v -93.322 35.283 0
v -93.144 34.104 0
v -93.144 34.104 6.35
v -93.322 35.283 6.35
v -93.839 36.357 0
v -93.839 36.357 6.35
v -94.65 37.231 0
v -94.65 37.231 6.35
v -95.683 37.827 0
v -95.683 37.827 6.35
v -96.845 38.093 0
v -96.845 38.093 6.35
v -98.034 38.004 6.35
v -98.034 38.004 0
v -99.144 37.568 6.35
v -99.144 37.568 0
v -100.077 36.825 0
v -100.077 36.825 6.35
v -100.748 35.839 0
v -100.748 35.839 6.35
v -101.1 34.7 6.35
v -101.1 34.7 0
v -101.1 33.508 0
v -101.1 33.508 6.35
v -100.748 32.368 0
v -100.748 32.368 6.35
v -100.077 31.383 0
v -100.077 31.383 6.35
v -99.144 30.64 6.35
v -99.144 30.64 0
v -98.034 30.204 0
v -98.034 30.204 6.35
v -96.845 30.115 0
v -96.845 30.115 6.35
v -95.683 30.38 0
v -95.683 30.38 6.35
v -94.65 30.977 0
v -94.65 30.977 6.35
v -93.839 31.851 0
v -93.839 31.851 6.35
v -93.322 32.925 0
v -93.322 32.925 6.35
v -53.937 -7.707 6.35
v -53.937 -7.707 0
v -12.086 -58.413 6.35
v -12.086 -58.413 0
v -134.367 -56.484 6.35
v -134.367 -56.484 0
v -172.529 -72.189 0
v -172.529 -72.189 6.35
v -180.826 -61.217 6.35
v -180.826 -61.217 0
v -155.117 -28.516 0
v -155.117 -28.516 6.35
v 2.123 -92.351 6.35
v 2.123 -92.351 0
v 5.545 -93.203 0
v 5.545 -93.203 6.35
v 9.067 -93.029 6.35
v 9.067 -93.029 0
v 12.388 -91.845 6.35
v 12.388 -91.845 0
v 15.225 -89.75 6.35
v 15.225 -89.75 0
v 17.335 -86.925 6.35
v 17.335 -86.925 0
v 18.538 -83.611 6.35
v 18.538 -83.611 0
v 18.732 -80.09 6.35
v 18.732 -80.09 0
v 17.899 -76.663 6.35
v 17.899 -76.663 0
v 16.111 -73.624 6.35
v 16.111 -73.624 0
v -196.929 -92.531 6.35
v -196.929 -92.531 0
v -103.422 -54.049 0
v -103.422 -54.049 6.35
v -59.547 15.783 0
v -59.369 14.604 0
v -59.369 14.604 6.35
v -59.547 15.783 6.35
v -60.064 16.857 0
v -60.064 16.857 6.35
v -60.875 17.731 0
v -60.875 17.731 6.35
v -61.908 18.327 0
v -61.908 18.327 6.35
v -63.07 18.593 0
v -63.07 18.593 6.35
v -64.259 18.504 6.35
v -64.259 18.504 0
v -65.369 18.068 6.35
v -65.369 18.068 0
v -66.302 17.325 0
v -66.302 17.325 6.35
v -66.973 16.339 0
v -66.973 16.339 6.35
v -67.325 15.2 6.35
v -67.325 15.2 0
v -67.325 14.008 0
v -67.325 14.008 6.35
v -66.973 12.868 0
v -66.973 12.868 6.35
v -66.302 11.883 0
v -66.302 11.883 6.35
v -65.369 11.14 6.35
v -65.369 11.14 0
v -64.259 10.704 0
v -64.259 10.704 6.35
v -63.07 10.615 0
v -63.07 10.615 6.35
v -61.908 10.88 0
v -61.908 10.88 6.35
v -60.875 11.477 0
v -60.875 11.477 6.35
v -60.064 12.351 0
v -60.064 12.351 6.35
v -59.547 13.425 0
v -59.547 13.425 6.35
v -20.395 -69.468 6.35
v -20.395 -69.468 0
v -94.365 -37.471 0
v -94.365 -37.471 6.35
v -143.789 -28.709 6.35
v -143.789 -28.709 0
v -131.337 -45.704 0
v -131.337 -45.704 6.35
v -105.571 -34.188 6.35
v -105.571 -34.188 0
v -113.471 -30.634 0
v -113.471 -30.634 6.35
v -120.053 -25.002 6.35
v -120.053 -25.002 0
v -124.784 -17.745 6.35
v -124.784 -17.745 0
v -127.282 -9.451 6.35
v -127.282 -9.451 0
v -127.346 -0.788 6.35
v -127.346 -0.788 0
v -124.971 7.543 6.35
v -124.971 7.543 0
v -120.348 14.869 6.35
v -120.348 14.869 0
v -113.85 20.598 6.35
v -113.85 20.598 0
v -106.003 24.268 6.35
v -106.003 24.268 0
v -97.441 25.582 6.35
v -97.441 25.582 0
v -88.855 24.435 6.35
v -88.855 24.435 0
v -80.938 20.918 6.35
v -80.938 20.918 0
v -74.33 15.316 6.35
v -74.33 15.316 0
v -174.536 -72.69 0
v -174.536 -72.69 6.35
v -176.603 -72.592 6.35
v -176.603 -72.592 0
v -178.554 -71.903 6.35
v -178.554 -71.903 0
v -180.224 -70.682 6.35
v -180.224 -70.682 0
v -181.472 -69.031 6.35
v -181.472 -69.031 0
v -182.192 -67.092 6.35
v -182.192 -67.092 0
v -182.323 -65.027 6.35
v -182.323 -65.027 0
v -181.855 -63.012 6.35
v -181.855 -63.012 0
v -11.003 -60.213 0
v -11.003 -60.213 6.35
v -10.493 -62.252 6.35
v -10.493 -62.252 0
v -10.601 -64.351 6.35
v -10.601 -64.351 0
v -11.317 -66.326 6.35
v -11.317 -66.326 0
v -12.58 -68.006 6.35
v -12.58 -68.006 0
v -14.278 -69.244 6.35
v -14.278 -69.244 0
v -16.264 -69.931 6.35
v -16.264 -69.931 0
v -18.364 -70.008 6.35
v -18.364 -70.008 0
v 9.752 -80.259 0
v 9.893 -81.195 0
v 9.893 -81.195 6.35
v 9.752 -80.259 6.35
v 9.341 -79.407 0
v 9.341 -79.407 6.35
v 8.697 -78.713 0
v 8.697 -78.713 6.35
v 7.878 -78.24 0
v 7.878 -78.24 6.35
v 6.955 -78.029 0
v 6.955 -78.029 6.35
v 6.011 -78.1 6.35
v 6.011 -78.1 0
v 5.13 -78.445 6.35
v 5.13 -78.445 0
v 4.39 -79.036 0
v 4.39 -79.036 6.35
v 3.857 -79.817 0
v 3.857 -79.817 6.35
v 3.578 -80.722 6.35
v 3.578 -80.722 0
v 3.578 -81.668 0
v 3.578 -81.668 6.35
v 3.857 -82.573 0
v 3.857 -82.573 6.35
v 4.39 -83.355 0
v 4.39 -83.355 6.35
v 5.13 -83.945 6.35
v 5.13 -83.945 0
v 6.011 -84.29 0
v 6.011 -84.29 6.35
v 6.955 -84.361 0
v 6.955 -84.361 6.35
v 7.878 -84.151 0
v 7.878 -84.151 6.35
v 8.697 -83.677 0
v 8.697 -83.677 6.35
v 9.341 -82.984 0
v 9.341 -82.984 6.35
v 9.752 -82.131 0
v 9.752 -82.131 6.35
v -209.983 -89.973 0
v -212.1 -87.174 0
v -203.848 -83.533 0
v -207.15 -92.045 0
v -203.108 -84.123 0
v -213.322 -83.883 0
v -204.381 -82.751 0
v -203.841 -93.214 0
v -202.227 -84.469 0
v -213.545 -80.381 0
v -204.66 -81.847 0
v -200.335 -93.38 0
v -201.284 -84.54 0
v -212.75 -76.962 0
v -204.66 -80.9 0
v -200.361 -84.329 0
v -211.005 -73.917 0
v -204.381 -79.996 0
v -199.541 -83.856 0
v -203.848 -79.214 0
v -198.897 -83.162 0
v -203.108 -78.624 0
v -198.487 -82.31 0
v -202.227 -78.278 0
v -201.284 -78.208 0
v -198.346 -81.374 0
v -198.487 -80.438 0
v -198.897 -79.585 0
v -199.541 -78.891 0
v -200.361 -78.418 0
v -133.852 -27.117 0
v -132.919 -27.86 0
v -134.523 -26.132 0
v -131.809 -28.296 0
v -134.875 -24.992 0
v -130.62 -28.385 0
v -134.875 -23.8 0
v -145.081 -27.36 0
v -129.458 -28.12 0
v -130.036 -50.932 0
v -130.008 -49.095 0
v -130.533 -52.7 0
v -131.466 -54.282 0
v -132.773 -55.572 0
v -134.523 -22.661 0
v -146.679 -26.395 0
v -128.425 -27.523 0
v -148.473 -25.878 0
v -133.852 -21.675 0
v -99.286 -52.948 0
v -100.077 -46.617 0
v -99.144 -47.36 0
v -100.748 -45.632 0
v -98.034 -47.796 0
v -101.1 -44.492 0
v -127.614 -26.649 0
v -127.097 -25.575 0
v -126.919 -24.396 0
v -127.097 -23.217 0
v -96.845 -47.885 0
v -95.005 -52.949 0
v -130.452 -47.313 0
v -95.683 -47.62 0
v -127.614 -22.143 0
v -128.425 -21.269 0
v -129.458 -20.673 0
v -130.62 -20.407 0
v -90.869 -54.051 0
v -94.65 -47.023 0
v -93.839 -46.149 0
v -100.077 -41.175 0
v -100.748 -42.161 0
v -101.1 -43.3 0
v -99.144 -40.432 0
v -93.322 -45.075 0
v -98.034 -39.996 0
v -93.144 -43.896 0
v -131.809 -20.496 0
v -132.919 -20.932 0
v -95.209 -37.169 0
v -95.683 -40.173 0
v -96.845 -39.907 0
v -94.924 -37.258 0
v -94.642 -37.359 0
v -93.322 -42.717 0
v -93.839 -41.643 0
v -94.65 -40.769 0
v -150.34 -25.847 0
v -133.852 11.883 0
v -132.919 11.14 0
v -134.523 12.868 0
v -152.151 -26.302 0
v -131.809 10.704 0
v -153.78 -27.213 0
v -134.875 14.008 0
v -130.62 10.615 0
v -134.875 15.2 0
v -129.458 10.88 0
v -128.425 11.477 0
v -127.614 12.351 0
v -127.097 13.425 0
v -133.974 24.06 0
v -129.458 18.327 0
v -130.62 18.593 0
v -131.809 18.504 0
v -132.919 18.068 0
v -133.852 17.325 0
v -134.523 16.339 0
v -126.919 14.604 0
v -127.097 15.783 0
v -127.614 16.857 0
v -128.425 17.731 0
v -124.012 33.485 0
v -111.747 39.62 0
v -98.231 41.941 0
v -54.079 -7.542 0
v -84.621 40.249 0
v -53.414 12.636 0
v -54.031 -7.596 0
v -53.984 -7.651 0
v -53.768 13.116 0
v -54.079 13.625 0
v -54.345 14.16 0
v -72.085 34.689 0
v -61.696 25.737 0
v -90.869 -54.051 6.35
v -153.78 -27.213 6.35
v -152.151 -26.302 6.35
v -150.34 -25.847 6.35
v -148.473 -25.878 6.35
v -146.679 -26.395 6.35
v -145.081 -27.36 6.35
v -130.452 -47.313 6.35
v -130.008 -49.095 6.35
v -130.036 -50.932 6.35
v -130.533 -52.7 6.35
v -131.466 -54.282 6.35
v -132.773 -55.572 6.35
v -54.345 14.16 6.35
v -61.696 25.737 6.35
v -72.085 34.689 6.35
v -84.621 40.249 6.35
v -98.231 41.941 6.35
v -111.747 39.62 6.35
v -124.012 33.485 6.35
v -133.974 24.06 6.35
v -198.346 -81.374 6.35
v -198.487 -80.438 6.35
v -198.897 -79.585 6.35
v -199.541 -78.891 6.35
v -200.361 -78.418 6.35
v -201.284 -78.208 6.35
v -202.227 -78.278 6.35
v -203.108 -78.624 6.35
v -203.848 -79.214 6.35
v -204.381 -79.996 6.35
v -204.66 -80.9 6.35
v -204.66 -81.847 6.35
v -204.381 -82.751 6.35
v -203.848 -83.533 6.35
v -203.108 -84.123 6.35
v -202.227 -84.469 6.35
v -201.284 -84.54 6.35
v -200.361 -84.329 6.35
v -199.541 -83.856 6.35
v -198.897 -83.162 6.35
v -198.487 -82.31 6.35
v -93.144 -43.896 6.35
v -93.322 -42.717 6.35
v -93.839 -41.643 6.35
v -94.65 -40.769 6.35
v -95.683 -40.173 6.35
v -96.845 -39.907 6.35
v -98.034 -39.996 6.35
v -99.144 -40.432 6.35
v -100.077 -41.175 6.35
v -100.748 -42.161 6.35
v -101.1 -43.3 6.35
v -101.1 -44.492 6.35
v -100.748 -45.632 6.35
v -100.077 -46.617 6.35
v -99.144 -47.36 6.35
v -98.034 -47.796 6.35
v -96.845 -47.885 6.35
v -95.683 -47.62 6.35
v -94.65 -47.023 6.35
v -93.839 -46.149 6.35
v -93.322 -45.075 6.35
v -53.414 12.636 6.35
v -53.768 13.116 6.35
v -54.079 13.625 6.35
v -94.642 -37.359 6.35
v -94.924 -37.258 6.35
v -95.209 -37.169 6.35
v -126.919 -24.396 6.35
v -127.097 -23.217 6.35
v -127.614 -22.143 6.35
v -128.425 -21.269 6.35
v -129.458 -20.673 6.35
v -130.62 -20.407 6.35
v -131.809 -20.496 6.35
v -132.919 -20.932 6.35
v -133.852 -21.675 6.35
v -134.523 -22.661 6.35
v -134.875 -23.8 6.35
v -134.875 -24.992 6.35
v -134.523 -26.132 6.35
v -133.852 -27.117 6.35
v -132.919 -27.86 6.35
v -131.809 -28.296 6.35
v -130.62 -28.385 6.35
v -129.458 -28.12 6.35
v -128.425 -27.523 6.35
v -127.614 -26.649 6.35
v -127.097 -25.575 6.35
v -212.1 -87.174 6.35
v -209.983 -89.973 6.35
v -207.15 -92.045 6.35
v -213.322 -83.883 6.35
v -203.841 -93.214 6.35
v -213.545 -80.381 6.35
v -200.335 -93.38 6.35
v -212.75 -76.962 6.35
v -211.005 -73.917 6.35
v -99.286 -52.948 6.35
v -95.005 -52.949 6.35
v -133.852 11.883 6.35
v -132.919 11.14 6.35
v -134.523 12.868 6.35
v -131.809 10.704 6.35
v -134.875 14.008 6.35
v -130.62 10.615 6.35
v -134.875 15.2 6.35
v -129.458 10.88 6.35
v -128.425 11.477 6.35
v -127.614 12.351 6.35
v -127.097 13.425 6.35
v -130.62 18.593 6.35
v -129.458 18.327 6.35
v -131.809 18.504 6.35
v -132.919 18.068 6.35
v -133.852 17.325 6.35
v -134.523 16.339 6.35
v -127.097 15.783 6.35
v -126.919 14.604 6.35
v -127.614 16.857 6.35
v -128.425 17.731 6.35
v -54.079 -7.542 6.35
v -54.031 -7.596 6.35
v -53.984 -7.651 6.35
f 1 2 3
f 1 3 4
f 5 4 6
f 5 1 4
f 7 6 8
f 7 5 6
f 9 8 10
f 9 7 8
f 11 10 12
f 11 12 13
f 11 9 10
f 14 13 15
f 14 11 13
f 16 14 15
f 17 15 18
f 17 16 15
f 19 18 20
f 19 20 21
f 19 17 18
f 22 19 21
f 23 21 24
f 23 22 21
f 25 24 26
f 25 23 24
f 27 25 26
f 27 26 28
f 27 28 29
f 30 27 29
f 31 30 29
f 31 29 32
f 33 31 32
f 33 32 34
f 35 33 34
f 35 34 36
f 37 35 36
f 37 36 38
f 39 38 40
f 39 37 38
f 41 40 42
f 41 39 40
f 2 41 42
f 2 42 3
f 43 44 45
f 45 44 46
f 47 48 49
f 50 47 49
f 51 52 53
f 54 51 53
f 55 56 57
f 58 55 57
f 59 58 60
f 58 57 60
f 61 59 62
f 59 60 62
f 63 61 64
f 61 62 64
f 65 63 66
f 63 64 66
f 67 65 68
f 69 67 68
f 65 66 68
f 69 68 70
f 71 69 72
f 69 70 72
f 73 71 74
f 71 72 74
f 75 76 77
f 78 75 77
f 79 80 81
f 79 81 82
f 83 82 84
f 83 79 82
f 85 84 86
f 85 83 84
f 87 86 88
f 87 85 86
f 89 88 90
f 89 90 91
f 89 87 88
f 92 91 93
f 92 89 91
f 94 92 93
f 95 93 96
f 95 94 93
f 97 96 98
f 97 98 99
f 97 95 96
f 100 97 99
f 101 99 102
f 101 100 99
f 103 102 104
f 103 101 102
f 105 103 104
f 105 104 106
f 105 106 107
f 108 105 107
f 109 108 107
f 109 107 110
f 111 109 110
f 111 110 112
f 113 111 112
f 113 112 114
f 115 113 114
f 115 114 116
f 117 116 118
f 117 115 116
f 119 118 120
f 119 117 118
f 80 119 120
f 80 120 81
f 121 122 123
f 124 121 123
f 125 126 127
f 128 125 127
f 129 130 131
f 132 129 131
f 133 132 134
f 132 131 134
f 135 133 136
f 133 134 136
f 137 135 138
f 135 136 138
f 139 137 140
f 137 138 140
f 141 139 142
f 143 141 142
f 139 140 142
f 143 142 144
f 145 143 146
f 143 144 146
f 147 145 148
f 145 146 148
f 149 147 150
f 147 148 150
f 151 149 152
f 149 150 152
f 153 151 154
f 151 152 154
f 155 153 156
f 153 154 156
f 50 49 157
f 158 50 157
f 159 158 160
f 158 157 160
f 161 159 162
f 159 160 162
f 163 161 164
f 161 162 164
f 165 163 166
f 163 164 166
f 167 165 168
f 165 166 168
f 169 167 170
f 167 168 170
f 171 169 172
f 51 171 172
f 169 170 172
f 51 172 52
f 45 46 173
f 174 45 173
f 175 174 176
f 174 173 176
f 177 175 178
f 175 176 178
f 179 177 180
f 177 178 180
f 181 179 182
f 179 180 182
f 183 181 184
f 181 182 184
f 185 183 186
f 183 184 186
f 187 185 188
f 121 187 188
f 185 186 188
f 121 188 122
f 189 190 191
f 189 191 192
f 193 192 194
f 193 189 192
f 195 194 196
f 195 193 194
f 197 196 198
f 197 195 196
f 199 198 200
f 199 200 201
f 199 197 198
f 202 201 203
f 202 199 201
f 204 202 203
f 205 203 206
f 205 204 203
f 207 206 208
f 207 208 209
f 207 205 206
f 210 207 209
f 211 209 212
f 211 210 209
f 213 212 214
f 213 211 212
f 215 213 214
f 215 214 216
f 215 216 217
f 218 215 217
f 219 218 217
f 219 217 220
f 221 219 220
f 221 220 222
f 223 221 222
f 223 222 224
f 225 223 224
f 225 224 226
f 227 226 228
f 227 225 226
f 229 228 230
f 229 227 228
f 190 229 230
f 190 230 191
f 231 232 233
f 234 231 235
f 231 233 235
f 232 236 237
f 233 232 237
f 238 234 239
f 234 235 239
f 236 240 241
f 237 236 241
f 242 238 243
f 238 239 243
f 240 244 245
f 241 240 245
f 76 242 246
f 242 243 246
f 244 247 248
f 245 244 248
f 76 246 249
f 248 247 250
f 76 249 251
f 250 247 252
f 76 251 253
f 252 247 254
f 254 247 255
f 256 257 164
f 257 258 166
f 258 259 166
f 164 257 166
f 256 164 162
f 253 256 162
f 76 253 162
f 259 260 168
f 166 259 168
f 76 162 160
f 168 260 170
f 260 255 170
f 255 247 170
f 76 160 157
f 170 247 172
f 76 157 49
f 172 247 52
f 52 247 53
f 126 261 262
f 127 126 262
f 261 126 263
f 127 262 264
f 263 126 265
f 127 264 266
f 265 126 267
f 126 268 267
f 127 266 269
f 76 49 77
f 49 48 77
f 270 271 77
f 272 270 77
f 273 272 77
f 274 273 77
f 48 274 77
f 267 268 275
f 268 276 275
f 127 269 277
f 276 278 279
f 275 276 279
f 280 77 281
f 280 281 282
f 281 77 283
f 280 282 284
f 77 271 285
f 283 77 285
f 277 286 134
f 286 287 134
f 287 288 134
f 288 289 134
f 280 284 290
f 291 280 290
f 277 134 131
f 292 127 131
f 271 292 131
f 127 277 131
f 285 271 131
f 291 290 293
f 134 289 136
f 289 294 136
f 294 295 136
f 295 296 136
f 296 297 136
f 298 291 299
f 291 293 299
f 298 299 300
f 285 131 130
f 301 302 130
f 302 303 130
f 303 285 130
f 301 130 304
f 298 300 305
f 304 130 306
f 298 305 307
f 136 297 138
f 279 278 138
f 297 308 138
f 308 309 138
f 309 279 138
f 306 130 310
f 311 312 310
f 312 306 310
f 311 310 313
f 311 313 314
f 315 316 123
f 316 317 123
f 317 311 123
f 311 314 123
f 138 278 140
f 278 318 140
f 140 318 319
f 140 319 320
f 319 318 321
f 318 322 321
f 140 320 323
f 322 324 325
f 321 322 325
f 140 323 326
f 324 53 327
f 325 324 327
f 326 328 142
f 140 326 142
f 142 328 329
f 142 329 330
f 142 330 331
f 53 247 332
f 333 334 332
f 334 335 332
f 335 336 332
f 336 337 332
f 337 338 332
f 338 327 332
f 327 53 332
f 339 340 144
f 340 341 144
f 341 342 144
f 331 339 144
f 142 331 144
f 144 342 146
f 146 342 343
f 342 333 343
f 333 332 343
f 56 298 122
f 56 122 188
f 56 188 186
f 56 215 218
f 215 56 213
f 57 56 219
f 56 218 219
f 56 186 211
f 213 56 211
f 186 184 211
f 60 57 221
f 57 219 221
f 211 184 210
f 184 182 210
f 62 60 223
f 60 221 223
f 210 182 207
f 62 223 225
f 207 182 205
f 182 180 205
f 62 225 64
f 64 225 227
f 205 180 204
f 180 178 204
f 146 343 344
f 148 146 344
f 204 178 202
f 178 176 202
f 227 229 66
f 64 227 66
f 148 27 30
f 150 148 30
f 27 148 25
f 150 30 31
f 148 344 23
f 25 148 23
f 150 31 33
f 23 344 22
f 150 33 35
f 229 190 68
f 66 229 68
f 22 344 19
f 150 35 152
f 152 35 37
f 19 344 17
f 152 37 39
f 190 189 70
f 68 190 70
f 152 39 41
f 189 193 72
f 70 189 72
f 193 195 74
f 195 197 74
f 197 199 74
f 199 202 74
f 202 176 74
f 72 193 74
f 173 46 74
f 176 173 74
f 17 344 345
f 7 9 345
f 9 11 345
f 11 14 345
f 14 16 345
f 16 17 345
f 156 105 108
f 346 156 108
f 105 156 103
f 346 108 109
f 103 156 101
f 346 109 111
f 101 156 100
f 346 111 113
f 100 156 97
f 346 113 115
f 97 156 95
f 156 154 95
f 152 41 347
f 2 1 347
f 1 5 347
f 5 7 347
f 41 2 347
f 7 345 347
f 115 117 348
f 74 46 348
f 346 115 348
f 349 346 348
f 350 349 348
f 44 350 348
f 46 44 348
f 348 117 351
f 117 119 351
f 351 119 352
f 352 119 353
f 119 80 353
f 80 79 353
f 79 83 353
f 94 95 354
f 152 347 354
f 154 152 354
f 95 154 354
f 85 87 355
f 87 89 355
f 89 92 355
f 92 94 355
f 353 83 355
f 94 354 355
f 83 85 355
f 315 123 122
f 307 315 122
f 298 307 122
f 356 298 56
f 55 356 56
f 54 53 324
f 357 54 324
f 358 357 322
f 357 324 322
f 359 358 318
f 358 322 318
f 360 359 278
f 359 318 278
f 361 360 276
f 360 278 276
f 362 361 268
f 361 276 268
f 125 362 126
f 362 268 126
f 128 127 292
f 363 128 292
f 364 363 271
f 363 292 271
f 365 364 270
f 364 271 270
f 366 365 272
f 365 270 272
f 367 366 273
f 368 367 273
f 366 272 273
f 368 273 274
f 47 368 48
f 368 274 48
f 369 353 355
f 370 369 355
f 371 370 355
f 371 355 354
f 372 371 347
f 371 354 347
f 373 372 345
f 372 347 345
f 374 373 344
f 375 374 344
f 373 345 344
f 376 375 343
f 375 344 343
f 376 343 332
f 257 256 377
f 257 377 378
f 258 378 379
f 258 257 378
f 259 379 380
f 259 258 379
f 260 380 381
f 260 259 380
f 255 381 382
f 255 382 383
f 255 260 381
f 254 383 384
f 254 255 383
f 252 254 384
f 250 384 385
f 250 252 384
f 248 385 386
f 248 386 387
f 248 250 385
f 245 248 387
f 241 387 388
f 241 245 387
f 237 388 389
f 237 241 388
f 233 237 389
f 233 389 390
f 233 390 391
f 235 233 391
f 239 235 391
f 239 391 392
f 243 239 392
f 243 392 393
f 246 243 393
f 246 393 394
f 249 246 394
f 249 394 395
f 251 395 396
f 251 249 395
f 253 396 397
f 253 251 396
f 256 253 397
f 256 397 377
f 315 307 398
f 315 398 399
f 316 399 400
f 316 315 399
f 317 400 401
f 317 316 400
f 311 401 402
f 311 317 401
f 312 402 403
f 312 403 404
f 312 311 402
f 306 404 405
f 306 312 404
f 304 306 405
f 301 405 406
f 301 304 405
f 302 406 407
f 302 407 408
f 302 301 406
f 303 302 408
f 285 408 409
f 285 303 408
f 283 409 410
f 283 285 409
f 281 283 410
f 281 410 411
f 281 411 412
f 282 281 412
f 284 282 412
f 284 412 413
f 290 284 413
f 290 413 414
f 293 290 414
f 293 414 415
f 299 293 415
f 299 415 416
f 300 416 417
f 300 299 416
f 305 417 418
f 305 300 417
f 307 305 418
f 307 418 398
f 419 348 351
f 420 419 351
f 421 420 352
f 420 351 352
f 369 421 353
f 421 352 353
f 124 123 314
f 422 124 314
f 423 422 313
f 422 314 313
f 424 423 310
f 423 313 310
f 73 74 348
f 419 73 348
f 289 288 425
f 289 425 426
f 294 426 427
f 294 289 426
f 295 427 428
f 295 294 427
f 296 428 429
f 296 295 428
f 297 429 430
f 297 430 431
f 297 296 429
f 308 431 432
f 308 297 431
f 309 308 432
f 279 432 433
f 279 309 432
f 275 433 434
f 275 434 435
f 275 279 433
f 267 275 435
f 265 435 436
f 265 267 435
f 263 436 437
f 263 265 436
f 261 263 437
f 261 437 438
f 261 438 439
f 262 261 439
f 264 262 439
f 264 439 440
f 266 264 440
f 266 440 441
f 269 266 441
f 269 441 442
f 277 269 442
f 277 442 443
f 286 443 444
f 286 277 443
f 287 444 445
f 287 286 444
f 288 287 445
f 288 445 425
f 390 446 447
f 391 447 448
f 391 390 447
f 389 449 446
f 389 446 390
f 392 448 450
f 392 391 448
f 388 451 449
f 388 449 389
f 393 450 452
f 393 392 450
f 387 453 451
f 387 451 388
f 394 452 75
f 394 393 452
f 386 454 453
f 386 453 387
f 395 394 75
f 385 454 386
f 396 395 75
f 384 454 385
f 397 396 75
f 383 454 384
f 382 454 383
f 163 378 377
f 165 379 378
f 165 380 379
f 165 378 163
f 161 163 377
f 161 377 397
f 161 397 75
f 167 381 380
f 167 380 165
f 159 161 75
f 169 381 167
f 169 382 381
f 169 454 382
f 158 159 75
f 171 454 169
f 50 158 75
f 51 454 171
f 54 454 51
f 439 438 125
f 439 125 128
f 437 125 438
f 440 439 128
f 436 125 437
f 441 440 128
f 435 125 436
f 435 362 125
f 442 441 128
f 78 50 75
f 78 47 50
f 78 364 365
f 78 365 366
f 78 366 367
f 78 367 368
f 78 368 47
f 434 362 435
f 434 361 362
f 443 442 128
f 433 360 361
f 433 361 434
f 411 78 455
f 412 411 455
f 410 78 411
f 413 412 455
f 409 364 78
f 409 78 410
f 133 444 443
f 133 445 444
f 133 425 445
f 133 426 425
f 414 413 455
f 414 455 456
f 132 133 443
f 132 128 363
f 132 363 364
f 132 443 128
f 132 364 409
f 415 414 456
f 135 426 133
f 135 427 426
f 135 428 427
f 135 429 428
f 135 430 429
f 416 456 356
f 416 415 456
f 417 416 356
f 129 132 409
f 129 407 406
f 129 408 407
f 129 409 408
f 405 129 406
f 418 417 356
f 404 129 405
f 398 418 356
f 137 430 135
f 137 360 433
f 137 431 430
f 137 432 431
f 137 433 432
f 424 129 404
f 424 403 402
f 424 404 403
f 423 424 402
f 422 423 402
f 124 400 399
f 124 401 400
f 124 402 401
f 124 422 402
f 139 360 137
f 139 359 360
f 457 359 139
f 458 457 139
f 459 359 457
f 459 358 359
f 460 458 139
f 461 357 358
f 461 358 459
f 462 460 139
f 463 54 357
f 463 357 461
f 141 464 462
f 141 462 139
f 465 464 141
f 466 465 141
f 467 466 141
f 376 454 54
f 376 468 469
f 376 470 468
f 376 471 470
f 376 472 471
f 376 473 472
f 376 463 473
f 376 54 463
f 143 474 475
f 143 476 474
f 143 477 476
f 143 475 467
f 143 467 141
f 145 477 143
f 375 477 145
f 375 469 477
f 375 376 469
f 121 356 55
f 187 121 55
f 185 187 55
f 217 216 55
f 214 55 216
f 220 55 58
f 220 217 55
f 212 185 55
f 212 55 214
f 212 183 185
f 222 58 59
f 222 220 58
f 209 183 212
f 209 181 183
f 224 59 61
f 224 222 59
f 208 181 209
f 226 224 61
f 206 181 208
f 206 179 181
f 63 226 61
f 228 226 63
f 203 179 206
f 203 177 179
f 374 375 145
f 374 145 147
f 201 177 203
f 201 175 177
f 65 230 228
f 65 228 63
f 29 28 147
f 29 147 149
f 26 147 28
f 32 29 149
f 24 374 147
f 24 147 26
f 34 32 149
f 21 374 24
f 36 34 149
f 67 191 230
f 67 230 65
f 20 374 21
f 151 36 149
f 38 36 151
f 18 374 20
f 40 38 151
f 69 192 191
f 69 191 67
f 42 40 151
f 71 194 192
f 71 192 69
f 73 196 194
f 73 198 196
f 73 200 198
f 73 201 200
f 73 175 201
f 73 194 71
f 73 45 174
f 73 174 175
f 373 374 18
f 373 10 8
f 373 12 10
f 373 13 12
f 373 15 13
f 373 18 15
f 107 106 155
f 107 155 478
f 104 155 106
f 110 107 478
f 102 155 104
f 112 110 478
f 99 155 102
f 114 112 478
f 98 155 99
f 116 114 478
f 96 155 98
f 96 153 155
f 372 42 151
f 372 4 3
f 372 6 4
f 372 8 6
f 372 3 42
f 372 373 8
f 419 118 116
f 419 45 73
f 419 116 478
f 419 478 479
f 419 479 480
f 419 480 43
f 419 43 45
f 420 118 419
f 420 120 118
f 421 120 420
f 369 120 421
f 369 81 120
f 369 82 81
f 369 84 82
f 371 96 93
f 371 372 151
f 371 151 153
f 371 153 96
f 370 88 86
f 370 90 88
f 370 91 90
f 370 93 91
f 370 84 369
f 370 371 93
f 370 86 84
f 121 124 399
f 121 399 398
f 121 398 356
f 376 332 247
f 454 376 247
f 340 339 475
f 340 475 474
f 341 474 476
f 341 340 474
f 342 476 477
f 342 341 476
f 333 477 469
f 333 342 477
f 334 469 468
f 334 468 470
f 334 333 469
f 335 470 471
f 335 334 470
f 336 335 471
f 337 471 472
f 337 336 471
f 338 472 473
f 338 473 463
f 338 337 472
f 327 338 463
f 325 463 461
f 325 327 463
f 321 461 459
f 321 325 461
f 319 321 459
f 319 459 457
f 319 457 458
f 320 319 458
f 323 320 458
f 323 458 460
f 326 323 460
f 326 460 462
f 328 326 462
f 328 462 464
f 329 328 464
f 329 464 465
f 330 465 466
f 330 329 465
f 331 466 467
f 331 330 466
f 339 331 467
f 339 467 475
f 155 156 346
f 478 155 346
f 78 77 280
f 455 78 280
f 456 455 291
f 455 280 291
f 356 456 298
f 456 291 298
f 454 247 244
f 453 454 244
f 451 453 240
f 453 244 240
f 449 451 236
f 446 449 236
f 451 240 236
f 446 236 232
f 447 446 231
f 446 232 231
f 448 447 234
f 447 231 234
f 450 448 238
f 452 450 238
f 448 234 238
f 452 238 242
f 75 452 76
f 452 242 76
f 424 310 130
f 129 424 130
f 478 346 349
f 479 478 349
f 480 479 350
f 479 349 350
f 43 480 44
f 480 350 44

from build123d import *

# Parameters (mm, degrees)
SKETCH3_R           = 4
SKETCH3_R_2         = 3.175
BOSS_EXTRUDE1_DEPTH = 6.35


with BuildPart() as part:
    # Sketch3 → Boss-Extrude1 (new body)
    with BuildSketch(Plane.XY):
        with BuildLine():
            ThreePointArc((-54.344755215, 14.159551399), (-91.363790432, 41.595955293), (-133.974414464, 24.060278895))
            Line((-133.974414464, 24.060278895), (-211.005412605, -73.916742383))
            ThreePointArc((-211.005412605, -73.916742383), (-211.144018552, -88.650897892), (-196.929213693, -92.530829979))
            Line((-196.929213693, -92.530829979), (-103.422476429, -54.04933414))
            ThreePointArc((-103.422476429, -54.04933414), (-97.145595861, -52.808695879), (-90.869059624, -54.05107498))
            Line((-90.869059624, -54.05107498), (2.122974069, -92.350913963))
            ThreePointArc((2.122974069, -92.350913963), (16.383743715, -88.415214787), (16.111301916, -73.623830322))
            Line((16.111301916, -73.623830322), (-53.413545275, 12.636035393))
            ThreePointArc((-53.413545275, 12.636035393), (-53.928639798, 13.36754418), (-54.344755215, 14.159551399))
        make_face()
        with BuildLine():
            ThreePointArc((-94.365331084, -37.471342529), (-94.782391681, -37.306590994), (-95.20914515, -37.168880842))
            Line((-95.20914515, -37.168880842), (-105.570837866, -34.188121867))
            ThreePointArc((-105.570837866, -34.188121867), (-122.920802355, 11.370636159), (-74.330134016, 15.316349154))
            Line((-74.330134016, 15.316349154), (-54.078953085, -7.541638988))
            ThreePointArc((-54.078953085, -7.541638988), (-54.00749546, -7.623730088), (-53.937484416, -7.707058323))
            Line((-53.937484416, -7.707058323), (-12.08621589, -58.41284178))
            ThreePointArc((-12.08621589, -58.41284178), (-11.885929876, -67.212968778), (-20.394707026, -69.467533275))
            Line((-20.394707026, -69.467533275), (-94.365331084, -37.471342529))
        make_face(mode=Mode.SUBTRACT)
        with BuildLine():
            ThreePointArc((-172.528906448, -72.18914022), (-180.908159839, -69.902022358), (-180.826455281, -61.216625426))
            Line((-180.826455281, -61.216625426), (-155.117076369, -28.516434264))
            ThreePointArc((-155.117076369, -28.516434264), (-149.40547172, -25.801135391), (-143.78928279, -28.708659687))
            Line((-143.78928279, -28.708659687), (-131.33676671, -45.703813477))
            ThreePointArc((-131.33676671, -45.703813477), (-130.226967626, -51.831800551), (-134.367011458, -56.484102848))
            Line((-134.367011458, -56.484102848), (-172.528906448, -72.18914022))
        make_face(mode=Mode.SUBTRACT)
        with Locations((-130.919350653, -24.396060329)):
            Circle(SKETCH3_R, mode=Mode.SUBTRACT)
        with Locations((-97.144359905, -43.896060329)):
            Circle(SKETCH3_R, mode=Mode.SUBTRACT)
        with Locations((-130.919350653, 14.603939671)):
            Circle(SKETCH3_R, mode=Mode.SUBTRACT)
        with Locations((-63.369369158, 14.603939671)):
            Circle(SKETCH3_R, mode=Mode.SUBTRACT)
        with Locations((-97.144359905, 34.103939671)):
            Circle(SKETCH3_R, mode=Mode.SUBTRACT)
        with Locations((6.717643784, -81.195052938)):
            Circle(SKETCH3_R_2, mode=Mode.SUBTRACT)
        with Locations((-201.520789163, -81.373695056)):
            Circle(SKETCH3_R_2, mode=Mode.SUBTRACT)
    extrude(amount=BOSS_EXTRUDE1_DEPTH)


solid = part.part
